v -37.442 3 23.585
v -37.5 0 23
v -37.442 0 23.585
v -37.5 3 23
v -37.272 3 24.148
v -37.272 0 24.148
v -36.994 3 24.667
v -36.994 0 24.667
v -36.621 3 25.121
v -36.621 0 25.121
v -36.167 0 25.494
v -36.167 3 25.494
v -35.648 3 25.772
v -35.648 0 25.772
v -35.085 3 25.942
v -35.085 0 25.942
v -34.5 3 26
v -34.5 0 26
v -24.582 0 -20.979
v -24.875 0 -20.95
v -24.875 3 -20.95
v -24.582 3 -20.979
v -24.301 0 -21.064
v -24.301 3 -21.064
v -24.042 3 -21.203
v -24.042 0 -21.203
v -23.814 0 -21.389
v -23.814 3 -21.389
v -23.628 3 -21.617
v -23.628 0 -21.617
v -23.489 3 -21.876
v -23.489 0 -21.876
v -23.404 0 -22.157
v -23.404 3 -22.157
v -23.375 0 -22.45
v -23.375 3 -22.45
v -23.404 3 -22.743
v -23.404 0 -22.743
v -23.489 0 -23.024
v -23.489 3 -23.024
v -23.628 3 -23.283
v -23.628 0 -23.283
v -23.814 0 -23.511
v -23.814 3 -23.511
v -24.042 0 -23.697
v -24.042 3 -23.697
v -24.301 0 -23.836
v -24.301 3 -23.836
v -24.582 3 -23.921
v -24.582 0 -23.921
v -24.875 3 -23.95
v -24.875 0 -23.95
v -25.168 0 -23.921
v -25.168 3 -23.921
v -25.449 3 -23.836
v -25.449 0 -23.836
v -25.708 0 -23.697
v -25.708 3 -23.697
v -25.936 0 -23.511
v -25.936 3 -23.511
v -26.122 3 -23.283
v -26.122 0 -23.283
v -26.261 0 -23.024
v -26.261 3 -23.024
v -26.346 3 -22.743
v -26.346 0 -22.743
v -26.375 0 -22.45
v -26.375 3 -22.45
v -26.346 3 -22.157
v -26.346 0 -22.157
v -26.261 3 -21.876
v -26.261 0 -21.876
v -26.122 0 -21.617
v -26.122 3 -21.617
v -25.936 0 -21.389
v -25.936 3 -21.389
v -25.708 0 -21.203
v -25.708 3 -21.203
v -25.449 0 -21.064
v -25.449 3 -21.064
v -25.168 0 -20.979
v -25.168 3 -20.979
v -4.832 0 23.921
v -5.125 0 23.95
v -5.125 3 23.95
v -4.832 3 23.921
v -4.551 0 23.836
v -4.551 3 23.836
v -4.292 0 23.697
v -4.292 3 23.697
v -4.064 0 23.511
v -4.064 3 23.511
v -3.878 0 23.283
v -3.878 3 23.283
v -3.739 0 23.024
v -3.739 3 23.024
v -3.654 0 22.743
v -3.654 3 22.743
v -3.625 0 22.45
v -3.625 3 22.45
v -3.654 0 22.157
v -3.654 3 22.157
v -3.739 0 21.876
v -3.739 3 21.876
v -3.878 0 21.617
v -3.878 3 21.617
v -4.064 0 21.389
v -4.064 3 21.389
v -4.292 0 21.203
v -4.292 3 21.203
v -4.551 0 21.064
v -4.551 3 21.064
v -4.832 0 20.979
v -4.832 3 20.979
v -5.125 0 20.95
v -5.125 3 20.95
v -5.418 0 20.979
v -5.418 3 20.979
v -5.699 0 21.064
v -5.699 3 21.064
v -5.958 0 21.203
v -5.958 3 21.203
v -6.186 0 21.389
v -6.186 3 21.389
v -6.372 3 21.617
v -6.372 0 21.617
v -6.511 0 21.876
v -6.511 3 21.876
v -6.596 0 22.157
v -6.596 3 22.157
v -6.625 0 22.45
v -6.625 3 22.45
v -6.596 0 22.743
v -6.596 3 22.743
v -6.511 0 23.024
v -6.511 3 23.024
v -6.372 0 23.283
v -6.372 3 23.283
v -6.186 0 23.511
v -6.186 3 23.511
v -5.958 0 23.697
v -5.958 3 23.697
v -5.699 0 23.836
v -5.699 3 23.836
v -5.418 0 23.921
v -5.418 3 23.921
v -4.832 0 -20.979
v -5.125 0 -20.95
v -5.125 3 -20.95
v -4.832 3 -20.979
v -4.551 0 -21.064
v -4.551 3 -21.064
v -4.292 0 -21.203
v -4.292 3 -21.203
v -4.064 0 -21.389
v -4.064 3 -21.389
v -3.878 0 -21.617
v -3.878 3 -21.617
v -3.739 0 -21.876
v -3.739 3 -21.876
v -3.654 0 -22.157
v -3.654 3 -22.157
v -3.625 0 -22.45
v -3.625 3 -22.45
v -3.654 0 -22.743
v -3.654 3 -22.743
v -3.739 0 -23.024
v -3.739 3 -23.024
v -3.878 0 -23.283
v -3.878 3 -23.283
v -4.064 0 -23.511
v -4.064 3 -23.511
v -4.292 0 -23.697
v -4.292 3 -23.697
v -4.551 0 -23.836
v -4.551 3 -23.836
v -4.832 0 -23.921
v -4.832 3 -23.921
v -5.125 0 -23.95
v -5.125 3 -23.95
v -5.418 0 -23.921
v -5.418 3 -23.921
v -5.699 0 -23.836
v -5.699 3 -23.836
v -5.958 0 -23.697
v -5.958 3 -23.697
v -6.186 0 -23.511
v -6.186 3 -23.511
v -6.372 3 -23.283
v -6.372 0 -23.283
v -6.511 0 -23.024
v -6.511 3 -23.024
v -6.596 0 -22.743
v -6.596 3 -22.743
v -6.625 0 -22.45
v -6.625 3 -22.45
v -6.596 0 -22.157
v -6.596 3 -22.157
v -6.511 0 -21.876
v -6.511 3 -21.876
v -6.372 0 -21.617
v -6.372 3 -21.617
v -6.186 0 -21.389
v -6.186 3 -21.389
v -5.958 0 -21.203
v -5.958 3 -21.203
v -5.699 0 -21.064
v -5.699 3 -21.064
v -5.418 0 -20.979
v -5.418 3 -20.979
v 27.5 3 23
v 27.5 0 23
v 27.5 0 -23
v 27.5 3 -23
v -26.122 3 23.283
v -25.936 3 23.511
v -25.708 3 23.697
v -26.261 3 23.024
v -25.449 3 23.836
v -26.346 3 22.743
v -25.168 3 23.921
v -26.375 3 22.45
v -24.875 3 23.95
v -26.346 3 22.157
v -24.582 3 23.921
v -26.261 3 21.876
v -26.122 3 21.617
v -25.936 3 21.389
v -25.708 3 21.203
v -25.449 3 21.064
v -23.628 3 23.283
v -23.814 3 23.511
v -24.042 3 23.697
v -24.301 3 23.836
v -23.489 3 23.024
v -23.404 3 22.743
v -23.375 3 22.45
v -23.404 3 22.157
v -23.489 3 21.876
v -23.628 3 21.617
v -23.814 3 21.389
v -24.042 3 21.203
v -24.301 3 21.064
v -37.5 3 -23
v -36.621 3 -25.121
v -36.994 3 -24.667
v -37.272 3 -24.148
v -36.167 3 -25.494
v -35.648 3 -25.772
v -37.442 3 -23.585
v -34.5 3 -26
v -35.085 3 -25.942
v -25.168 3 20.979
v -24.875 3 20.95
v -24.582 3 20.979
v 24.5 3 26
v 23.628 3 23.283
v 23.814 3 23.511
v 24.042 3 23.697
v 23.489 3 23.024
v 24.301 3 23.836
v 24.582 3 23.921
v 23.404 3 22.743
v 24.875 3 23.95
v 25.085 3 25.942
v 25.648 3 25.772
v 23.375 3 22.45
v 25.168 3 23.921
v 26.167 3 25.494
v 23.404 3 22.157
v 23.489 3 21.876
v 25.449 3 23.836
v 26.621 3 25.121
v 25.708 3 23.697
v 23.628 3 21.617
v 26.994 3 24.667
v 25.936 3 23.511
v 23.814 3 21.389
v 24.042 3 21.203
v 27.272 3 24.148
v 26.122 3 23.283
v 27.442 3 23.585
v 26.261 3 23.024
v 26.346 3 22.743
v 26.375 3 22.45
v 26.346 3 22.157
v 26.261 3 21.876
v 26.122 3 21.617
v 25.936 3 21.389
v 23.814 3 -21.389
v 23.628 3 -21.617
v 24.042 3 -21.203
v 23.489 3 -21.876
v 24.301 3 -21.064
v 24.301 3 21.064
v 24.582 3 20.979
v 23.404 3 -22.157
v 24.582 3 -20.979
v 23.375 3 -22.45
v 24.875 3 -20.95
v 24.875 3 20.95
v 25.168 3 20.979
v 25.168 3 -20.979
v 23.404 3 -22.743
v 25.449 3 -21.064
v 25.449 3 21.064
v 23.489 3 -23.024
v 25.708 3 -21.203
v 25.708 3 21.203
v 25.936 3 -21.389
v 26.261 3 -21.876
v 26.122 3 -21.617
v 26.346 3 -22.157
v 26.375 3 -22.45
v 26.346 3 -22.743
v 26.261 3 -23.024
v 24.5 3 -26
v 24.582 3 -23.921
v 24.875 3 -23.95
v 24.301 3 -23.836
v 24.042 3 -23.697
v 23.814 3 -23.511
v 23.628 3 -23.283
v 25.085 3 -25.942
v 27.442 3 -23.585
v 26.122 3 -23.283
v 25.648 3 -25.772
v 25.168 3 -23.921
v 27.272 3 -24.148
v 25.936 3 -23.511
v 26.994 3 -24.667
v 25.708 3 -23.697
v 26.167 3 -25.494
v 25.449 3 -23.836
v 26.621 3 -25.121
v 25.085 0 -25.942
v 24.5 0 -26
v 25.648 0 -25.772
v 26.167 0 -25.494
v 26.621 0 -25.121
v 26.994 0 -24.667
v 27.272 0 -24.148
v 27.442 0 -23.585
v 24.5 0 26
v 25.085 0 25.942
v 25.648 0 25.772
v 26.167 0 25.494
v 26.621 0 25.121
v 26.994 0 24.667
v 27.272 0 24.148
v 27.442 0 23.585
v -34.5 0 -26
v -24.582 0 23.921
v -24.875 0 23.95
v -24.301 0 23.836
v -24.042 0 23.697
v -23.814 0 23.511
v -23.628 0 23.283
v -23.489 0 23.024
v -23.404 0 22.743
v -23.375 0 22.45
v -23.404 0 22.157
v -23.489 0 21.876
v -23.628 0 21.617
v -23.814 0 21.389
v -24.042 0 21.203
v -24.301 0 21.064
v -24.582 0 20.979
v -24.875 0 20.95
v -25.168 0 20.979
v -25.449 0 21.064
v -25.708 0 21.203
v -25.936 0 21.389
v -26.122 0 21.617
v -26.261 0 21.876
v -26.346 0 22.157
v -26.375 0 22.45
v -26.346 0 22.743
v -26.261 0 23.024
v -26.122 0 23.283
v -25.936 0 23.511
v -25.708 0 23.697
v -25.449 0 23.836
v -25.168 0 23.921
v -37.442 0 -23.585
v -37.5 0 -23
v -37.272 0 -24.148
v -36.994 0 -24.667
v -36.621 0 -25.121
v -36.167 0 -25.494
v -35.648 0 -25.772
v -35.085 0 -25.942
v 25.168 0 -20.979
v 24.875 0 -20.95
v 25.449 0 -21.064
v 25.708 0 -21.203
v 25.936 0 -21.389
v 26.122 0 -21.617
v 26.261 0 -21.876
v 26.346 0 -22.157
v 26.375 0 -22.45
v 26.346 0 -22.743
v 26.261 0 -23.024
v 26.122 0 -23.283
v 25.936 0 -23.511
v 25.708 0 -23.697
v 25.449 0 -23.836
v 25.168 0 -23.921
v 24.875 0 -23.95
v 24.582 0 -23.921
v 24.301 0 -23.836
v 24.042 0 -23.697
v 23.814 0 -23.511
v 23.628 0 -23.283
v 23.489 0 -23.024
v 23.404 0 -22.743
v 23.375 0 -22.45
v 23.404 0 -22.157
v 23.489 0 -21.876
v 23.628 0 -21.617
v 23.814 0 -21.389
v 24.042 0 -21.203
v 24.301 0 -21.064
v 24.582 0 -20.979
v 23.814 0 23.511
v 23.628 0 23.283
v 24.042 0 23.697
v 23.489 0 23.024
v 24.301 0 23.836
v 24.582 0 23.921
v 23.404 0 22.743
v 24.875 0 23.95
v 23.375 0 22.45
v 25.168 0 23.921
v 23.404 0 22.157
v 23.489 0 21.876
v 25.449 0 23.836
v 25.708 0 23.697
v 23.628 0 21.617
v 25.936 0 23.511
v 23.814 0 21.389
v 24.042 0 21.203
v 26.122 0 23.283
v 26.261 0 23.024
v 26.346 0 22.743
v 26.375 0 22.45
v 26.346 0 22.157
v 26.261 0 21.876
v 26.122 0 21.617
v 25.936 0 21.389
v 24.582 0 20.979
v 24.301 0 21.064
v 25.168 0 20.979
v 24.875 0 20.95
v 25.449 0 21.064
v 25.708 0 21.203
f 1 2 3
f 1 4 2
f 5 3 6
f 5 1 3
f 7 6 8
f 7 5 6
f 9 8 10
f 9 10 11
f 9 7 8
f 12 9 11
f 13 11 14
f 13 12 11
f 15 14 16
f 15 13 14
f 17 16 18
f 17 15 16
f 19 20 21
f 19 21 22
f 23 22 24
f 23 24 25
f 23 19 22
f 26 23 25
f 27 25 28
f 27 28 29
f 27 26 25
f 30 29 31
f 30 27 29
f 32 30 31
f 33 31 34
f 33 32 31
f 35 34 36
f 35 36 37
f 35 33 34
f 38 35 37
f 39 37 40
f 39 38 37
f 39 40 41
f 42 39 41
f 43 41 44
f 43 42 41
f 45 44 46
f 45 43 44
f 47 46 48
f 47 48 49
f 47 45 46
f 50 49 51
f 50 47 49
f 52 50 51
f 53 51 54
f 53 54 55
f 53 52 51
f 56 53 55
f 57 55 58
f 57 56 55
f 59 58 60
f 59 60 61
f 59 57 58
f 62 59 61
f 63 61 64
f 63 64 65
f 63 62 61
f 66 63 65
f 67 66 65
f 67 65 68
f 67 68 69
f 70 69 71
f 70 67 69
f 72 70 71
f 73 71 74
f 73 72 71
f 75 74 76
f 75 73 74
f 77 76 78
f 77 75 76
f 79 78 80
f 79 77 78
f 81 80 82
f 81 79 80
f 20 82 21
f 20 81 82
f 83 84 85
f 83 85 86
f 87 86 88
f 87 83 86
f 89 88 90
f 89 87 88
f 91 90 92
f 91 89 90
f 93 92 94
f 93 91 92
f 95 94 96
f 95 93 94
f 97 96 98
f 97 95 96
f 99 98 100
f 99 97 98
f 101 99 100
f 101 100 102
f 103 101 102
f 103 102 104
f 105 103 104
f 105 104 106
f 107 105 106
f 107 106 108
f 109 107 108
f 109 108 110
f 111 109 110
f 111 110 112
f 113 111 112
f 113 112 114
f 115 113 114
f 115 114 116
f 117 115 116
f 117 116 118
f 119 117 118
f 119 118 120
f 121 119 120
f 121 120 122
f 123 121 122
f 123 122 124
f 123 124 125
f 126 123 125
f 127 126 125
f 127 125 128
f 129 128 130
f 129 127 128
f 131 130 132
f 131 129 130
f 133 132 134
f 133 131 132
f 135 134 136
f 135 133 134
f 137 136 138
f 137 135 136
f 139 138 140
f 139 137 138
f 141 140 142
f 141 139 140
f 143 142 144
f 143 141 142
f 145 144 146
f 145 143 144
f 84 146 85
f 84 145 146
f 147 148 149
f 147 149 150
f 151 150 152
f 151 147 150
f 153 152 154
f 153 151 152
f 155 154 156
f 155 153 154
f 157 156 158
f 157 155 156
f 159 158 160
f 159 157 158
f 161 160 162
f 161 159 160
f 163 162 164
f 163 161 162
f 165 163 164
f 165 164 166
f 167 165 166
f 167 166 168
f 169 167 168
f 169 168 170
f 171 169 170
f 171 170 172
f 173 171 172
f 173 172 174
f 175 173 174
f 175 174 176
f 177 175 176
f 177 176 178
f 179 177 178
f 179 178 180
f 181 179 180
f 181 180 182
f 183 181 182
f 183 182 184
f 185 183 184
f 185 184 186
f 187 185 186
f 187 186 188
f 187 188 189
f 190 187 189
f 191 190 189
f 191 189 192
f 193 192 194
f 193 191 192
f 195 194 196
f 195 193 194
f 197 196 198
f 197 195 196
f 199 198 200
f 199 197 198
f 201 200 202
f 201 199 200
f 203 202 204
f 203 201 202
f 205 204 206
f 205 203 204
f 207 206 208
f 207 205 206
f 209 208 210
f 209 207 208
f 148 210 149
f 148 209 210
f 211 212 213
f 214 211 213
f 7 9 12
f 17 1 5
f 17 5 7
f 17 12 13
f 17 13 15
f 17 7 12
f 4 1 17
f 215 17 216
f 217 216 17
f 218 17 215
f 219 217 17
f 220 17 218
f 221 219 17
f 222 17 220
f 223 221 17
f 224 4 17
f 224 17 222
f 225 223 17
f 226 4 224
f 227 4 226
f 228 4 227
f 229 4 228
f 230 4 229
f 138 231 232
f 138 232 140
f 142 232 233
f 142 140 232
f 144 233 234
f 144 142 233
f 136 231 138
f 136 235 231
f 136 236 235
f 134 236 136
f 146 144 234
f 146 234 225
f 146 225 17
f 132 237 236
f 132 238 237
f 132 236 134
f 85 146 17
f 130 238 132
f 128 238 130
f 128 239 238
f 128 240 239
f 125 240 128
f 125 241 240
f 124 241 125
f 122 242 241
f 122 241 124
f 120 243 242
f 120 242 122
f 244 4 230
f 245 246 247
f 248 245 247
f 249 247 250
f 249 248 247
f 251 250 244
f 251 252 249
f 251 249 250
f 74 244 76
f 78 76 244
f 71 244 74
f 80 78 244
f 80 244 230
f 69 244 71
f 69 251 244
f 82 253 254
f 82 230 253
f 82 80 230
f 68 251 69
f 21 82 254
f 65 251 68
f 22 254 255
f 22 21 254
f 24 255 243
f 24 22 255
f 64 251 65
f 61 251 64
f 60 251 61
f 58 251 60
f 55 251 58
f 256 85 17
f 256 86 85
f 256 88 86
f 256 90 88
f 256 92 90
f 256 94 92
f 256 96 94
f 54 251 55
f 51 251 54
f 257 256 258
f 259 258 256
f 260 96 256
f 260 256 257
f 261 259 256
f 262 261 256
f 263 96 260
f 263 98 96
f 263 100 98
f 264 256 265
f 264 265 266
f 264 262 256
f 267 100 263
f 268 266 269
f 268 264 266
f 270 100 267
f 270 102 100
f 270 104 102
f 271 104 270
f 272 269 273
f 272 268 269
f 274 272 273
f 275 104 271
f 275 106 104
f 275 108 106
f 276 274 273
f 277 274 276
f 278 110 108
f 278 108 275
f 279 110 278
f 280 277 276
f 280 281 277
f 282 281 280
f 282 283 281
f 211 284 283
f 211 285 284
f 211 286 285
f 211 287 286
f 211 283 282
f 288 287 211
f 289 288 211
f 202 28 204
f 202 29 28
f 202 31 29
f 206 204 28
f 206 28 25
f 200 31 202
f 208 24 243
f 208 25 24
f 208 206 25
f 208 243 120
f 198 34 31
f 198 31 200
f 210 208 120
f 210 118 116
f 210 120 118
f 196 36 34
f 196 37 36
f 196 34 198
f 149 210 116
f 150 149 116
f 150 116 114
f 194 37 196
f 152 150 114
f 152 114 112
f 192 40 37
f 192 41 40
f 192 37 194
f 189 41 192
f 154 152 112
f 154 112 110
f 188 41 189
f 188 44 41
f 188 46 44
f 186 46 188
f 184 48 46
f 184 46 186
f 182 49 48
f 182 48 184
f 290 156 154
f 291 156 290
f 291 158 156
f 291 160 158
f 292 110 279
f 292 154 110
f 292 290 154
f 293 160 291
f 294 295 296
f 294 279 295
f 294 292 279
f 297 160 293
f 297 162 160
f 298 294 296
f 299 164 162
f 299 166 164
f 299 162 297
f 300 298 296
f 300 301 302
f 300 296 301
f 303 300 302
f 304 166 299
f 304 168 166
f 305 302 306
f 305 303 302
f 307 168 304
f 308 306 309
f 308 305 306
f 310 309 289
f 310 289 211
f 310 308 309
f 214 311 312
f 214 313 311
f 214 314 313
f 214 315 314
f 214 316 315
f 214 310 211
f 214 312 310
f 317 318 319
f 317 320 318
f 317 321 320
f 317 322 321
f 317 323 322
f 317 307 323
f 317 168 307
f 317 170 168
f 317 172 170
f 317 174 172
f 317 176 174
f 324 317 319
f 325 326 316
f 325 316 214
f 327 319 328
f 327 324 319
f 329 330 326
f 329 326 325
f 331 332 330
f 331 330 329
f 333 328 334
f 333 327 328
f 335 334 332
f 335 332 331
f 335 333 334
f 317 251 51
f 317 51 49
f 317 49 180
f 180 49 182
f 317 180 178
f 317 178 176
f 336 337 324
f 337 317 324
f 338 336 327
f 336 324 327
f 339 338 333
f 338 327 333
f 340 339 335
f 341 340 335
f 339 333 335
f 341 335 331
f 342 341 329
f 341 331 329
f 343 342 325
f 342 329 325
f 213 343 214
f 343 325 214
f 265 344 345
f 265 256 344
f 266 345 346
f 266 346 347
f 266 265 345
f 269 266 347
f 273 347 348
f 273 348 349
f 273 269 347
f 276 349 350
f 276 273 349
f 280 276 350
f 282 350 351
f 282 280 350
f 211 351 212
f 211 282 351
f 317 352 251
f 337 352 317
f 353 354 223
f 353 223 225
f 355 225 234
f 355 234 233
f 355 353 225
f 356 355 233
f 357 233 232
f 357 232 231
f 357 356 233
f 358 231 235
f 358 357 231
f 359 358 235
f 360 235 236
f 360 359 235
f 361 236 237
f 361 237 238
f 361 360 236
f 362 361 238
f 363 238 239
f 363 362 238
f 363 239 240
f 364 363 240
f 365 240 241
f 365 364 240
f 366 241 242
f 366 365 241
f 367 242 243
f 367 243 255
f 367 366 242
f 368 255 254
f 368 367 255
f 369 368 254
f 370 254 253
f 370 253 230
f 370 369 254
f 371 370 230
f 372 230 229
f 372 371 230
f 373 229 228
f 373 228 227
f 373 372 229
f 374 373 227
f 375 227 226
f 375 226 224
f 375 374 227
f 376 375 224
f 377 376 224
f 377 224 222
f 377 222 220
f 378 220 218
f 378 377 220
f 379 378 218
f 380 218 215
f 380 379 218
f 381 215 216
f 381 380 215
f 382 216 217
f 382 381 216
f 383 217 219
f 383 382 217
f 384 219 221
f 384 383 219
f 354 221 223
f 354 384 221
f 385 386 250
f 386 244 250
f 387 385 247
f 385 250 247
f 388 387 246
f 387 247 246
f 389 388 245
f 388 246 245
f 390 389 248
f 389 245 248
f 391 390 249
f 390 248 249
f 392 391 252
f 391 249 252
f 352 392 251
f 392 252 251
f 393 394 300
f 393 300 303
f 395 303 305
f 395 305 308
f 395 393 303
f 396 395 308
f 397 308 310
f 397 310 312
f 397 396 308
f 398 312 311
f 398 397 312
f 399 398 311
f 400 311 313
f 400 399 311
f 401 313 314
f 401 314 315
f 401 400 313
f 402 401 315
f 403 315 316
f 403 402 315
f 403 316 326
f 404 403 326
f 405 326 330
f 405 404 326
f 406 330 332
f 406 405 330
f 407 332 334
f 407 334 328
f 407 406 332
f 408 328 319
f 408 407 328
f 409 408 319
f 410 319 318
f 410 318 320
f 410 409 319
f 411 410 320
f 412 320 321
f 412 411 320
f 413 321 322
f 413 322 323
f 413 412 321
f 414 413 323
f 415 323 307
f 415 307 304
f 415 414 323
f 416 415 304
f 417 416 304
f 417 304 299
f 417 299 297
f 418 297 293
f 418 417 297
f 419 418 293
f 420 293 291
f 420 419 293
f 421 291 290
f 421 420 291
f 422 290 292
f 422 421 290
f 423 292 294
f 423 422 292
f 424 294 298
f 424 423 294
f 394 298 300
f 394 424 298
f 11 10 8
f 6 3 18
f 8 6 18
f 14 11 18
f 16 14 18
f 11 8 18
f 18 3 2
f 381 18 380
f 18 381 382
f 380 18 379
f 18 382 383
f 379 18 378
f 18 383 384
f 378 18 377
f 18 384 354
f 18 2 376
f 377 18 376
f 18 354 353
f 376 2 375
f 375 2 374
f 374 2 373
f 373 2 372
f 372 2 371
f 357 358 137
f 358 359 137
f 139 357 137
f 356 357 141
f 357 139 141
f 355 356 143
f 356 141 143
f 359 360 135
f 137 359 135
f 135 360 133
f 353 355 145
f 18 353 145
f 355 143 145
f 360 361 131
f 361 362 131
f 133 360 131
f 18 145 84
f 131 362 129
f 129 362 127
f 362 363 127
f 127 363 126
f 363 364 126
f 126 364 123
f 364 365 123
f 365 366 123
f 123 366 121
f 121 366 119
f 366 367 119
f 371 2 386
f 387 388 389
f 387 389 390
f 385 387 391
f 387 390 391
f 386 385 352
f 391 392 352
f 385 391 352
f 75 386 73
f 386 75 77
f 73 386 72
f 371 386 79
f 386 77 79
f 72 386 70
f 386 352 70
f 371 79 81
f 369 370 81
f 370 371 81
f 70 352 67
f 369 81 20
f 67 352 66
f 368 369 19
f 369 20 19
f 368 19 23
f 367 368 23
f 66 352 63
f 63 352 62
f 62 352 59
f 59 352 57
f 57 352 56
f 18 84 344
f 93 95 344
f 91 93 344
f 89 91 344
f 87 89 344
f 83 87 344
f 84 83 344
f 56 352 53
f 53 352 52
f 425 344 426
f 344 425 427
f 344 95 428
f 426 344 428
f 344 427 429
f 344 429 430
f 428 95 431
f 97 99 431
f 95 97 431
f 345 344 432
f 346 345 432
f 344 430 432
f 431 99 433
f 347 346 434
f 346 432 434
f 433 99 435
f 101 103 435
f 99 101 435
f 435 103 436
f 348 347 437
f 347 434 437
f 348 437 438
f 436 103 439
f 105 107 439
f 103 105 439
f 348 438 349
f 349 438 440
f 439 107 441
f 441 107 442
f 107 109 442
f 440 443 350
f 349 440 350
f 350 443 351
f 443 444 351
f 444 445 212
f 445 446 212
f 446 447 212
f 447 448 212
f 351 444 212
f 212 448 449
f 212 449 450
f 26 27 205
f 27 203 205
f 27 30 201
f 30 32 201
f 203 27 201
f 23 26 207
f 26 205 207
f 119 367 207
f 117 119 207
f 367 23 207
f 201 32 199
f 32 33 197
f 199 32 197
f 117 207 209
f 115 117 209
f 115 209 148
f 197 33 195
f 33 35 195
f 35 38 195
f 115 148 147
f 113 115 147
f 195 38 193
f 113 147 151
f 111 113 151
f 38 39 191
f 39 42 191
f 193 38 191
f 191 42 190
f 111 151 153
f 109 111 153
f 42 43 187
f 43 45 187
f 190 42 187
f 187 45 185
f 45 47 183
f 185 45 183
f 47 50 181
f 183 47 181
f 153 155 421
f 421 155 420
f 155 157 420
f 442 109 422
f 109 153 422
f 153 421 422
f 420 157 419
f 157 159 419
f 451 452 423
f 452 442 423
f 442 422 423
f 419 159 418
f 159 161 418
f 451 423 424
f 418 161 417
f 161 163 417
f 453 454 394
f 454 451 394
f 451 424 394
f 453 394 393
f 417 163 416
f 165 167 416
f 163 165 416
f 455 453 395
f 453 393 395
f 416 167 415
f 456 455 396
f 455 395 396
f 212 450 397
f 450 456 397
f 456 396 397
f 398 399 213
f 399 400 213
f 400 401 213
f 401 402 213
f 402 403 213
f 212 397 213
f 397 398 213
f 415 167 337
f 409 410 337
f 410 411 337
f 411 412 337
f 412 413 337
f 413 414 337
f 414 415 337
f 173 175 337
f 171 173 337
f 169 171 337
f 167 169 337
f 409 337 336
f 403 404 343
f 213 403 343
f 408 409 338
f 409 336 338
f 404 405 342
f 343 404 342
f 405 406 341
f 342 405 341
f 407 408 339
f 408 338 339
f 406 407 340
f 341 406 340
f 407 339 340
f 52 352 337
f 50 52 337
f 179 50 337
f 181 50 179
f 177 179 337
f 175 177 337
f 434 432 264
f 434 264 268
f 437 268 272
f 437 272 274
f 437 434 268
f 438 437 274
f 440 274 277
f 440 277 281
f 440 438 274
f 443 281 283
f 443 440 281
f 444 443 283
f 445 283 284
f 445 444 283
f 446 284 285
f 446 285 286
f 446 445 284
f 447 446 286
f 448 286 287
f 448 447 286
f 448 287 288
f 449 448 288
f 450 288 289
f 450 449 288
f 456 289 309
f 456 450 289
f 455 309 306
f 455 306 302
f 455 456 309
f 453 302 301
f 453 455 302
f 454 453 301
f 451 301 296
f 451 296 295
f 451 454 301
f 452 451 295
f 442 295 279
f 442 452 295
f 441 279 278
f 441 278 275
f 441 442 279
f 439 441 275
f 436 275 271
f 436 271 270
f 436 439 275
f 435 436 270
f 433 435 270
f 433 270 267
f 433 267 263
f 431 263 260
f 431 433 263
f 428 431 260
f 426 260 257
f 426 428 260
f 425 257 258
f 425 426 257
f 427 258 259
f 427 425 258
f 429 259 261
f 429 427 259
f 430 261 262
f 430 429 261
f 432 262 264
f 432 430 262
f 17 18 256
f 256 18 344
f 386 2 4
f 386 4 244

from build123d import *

# Parameters (mm, degrees)
SKETCH2_W           = 65
SKETCH2_H           = 52
SKETCH2_R           = 1.5
BOSS_EXTRUDE1_DEPTH = 3
FILLET1_R           = 3
CUT_EXTRUDE1_START  = -10
SKETCH3_R           = 1.5
CUT_EXTRUDE1_DEPTH  = 10


with BuildPart() as part:
    # Sketch2 → Boss-Extrude1 (new body)
    with BuildSketch(Plane(origin=(0, 0, 0), x_dir=(1, 0, 0), z_dir=(0, 1, 0))):
        with Locations((-5, 0)):
            Rectangle(SKETCH2_W, SKETCH2_H)
        with Locations(Location((-24.875, 22.45, 0), (0, 0, 270))):
            Circle(SKETCH2_R, mode=Mode.SUBTRACT)
        with Locations(Location((24.875, 22.45, 0), (0, 0, 270))):
            Circle(SKETCH2_R, mode=Mode.SUBTRACT)
        with Locations(Location((24.875, -22.45, 0), (0, 0, 270))):
            Circle(SKETCH2_R, mode=Mode.SUBTRACT)
        with Locations(Location((-24.875, -22.45, 0), (0, 0, 270))):
            Circle(SKETCH2_R, mode=Mode.SUBTRACT)
    extrude(amount=BOSS_EXTRUDE1_DEPTH)

    # Fillet1
    fillet1_edges = [part.edges().sort_by_distance(p)[0] for p in [
        (-37.5, 1.5, 26),
        (-37.5, 1.5, -26),
        (27.5, 1.5, -26),
        (27.5, 1.5, 26),
    ]]
    fillet(fillet1_edges, radius=FILLET1_R)

    # Sketch3 → Cut-Extrude1 (cut)
    with BuildSketch(Plane(origin=(0, 3, 0), x_dir=(1, 0, 0), z_dir=(0, 1, 0)).offset(CUT_EXTRUDE1_START)):
        with Locations(Location((24.875, 22.45, 0), (0, 0, 270))):
            Circle(SKETCH3_R)
        with Locations(Location((-5.125, 22.45, 0), (0, 0, 270))):
            Circle(SKETCH3_R)
        with Locations(Location((-5.125, -22.45, 0), (0, 0, 270))):
            Circle(SKETCH3_R)
        with Locations(Location((24.875, -22.45, 0), (0, 0, 270))):
            Circle(SKETCH3_R)
    extrude(amount=CUT_EXTRUDE1_DEPTH, mode=Mode.SUBTRACT)


solid = part.part
